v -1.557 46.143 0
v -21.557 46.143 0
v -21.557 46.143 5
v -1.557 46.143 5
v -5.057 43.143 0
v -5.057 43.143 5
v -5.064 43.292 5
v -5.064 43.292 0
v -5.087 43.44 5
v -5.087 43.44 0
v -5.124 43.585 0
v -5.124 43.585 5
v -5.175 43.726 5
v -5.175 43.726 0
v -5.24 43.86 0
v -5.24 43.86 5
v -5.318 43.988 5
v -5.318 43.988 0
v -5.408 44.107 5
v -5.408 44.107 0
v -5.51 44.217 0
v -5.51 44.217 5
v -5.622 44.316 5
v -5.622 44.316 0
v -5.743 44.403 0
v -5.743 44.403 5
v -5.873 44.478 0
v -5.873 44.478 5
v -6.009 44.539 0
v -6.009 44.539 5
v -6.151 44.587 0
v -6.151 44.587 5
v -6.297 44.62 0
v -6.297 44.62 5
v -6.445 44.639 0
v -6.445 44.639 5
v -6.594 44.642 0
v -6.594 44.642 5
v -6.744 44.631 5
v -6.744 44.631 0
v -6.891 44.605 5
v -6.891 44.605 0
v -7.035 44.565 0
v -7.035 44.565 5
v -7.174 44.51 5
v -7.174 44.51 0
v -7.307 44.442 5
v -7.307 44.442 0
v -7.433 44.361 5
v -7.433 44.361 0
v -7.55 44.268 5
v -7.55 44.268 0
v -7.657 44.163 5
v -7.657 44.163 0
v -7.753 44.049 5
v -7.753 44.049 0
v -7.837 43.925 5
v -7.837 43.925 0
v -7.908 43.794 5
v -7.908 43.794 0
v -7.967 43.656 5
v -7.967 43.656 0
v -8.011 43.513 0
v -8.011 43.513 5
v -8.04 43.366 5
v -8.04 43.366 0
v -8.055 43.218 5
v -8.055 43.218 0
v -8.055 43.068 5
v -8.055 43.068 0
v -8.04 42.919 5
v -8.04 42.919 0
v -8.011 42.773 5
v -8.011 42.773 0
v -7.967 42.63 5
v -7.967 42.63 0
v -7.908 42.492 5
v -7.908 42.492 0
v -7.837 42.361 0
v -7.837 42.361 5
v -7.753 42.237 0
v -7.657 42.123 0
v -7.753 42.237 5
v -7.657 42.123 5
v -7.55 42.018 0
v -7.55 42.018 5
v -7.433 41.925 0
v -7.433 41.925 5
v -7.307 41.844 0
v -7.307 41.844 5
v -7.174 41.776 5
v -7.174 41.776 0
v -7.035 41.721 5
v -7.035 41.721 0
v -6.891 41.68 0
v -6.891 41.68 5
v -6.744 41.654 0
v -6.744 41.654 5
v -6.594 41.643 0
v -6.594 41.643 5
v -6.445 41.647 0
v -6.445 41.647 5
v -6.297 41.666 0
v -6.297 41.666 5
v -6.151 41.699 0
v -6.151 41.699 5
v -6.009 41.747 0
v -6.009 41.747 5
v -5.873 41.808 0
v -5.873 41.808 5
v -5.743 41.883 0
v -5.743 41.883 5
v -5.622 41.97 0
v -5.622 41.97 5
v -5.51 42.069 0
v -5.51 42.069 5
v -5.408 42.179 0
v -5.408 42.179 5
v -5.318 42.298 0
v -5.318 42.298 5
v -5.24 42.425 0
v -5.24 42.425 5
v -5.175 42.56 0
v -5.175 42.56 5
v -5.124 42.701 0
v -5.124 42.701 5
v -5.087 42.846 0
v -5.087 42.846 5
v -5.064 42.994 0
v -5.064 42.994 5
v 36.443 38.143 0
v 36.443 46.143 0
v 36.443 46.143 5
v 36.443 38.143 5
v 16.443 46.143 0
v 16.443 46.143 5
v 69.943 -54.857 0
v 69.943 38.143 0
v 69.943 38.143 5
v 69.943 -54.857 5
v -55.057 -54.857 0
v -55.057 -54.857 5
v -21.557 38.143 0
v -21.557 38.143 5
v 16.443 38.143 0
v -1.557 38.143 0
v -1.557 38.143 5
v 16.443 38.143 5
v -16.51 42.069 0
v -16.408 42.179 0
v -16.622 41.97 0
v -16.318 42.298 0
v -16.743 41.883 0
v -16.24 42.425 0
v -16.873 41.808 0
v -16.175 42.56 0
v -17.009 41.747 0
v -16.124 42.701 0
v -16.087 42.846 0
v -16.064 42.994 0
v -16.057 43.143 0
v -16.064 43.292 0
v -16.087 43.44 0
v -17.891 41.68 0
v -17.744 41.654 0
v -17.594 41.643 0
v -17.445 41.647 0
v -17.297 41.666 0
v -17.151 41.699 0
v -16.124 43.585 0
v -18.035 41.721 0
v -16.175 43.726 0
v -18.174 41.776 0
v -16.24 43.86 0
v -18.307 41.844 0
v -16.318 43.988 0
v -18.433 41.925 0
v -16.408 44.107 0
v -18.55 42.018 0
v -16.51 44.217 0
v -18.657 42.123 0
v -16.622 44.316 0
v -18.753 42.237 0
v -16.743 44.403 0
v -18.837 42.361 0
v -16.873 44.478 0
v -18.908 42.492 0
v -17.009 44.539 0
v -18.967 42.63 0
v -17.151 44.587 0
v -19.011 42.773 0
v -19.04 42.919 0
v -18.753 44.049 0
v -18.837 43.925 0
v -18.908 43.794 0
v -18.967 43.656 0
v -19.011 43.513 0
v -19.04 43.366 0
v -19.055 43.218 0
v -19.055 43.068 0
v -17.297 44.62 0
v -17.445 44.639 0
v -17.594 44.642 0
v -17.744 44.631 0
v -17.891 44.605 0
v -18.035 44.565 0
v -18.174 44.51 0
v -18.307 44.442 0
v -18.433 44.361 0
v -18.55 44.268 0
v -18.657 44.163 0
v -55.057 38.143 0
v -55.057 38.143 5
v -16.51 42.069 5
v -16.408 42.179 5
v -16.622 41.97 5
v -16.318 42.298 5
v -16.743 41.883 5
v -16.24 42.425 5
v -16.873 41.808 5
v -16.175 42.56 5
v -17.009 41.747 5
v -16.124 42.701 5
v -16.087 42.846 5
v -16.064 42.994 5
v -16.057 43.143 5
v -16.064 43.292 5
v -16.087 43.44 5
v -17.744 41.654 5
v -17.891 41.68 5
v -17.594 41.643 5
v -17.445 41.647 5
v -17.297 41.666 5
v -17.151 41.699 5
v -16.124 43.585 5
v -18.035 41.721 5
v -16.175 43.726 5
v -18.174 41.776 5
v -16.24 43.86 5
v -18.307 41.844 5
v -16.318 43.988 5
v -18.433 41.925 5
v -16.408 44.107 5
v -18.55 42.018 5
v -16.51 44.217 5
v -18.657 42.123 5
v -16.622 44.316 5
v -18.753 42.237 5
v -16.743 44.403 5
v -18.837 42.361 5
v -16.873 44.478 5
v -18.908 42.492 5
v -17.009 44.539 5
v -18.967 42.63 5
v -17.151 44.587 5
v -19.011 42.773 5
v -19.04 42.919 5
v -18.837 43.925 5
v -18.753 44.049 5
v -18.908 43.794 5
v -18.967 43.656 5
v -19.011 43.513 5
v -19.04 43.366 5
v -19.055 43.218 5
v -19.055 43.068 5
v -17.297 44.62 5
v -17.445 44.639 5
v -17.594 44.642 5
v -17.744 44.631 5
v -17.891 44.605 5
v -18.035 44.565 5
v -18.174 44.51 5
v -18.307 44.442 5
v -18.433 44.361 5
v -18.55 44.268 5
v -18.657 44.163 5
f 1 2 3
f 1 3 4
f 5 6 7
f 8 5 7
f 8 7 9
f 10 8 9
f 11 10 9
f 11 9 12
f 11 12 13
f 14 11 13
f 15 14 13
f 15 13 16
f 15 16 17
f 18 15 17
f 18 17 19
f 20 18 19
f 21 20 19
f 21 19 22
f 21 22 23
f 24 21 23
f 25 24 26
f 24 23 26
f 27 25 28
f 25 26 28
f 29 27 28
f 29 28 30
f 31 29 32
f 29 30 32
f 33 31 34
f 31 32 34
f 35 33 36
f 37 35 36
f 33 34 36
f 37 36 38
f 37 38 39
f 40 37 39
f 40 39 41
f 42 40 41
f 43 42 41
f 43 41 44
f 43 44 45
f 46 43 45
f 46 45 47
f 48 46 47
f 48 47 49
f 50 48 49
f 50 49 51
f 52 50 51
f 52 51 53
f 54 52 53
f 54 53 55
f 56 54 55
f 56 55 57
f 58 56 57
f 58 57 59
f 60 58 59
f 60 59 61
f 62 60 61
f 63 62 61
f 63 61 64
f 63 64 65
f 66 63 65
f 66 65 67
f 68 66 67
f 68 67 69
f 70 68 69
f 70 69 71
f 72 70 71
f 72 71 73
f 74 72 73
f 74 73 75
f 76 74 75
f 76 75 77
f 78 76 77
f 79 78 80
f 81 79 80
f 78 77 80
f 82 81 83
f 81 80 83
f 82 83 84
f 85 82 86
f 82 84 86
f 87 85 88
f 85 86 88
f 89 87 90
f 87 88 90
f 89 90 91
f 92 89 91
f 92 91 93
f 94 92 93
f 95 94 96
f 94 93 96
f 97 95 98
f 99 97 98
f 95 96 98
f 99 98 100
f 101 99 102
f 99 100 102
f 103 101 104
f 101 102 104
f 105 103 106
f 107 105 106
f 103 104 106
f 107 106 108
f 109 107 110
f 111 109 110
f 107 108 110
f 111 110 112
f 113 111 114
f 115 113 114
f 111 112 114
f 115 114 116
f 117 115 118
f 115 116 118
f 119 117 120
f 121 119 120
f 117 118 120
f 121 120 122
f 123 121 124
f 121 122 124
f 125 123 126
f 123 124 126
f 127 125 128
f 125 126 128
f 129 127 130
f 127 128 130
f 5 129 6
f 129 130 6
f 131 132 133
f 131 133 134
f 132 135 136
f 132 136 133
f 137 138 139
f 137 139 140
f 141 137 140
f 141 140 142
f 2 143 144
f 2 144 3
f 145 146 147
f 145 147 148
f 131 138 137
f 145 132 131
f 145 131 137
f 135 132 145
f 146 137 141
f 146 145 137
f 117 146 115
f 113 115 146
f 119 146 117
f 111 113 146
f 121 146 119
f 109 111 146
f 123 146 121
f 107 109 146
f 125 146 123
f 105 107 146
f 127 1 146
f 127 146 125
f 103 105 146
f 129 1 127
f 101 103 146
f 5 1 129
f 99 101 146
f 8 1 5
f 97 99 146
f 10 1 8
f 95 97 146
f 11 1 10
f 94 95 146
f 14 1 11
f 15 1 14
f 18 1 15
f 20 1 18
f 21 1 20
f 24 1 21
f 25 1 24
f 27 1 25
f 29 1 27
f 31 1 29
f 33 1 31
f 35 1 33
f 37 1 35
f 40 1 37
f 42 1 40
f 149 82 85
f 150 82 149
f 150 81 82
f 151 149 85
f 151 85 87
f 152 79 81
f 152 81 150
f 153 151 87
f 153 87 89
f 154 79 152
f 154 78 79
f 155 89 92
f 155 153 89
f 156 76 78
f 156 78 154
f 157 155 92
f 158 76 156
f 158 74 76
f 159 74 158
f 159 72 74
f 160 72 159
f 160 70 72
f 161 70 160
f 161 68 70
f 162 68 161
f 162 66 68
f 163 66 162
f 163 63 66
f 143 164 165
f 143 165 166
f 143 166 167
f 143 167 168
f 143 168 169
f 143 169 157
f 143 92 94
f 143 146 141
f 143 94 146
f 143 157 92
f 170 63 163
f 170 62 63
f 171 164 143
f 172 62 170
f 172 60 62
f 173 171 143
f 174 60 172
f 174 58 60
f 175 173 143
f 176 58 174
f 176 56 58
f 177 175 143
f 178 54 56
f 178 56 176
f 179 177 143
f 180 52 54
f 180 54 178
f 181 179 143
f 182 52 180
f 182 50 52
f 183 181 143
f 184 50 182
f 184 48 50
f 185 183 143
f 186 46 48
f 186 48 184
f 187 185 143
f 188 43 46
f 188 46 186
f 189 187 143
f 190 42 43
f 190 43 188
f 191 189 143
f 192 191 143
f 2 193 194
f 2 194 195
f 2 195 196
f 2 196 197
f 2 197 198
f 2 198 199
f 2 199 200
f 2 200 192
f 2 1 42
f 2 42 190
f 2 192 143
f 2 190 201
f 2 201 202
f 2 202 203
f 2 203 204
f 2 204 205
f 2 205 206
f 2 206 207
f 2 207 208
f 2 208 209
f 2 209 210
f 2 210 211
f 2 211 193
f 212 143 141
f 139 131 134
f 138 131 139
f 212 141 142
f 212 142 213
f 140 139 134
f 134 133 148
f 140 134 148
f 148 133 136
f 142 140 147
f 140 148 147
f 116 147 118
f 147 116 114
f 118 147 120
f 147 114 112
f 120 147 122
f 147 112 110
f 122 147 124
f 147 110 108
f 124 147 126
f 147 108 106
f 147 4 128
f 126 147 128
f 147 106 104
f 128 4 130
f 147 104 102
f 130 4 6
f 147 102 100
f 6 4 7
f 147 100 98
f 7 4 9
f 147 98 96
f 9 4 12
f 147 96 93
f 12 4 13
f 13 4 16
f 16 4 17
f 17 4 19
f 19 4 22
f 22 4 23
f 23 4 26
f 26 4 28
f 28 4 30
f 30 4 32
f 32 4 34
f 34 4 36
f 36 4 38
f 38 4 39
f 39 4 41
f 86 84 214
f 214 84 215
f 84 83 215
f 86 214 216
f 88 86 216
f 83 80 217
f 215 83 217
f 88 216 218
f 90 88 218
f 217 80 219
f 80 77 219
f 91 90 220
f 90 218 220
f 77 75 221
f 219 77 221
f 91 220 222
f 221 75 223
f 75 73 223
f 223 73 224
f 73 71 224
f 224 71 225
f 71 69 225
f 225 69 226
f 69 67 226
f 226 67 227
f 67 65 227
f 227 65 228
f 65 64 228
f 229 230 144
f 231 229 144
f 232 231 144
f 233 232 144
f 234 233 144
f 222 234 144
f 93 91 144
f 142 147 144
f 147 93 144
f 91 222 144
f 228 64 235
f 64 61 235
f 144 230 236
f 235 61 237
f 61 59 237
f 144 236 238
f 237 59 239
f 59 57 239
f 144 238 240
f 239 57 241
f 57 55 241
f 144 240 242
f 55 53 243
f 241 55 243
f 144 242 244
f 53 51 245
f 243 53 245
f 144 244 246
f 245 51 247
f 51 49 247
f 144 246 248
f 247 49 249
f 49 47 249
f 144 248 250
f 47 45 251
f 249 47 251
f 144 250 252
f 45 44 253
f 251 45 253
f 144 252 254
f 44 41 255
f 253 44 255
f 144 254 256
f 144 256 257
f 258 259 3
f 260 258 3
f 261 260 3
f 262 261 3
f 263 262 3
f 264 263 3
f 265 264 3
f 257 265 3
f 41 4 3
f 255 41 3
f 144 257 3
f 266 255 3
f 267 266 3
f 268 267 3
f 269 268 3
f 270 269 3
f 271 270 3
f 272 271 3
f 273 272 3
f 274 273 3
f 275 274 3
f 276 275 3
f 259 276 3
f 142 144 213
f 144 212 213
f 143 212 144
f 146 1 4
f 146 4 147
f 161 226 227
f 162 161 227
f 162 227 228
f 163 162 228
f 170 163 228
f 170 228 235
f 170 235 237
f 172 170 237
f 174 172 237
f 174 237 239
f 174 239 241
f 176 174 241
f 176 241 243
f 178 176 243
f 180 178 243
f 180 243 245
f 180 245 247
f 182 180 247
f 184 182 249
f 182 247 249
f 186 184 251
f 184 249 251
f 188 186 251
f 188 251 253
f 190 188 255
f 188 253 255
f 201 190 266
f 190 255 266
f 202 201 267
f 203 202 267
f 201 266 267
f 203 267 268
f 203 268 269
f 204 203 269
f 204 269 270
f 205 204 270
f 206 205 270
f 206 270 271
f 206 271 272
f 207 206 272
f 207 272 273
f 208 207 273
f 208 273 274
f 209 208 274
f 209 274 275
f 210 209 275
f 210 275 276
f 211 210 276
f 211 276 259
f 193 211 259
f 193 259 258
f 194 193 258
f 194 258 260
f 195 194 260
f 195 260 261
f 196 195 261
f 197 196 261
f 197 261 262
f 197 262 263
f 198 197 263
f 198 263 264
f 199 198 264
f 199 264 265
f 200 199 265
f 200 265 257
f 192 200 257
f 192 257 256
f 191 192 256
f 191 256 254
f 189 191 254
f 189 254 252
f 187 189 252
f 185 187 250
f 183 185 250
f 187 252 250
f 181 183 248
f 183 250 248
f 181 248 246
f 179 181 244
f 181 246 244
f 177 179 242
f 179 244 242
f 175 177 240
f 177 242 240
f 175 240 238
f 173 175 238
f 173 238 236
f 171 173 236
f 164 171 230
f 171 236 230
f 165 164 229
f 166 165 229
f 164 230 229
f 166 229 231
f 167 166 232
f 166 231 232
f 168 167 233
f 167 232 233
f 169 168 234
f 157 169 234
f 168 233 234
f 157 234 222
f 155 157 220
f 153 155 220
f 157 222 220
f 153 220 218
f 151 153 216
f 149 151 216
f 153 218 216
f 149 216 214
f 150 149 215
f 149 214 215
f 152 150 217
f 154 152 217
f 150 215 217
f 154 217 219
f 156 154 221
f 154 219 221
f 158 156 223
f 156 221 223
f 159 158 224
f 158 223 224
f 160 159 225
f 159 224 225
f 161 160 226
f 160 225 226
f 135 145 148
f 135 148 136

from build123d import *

# Parameters (mm, degrees)
RESSALTO_EXTRUS_O1_DEPTH = 5
ESBO_O2_R                = 1.5
CORTE_EXTRUS_O1_DEPTH    = 10


with BuildPart() as part:
    # Esboço1 → Ressalto-extrusão1 (new body)
    with BuildSketch(Plane.XY):
        Polygon((-1.556986729, 38.142857143), (16.443013271, 38.142857143), (16.443013271, 46.142857143), (36.443013271, 46.142857143), (36.443013271, 38.142857143), (69.943013271, 38.142857143), (69.943013271, -54.857142857), (-55.056986729, -54.857142857), (-55.056986729, 38.142857143), (-21.556986729, 38.142857143), (-21.556986729, 46.142857143), (-1.556986729, 46.142857143), align=None)
    extrude(amount=RESSALTO_EXTRUS_O1_DEPTH)

    # Esboço2 → Corte-extrusão1 (cut)
    with BuildSketch(Plane.XY.offset(5)):
        with Locations((-17.556986729, 43.142857143)):
            Circle(ESBO_O2_R)
        with Locations((-6.556986729, 43.142857143)):
            Circle(ESBO_O2_R)
    extrude(amount=-CORTE_EXTRUS_O1_DEPTH, mode=Mode.SUBTRACT)


solid = part.part
